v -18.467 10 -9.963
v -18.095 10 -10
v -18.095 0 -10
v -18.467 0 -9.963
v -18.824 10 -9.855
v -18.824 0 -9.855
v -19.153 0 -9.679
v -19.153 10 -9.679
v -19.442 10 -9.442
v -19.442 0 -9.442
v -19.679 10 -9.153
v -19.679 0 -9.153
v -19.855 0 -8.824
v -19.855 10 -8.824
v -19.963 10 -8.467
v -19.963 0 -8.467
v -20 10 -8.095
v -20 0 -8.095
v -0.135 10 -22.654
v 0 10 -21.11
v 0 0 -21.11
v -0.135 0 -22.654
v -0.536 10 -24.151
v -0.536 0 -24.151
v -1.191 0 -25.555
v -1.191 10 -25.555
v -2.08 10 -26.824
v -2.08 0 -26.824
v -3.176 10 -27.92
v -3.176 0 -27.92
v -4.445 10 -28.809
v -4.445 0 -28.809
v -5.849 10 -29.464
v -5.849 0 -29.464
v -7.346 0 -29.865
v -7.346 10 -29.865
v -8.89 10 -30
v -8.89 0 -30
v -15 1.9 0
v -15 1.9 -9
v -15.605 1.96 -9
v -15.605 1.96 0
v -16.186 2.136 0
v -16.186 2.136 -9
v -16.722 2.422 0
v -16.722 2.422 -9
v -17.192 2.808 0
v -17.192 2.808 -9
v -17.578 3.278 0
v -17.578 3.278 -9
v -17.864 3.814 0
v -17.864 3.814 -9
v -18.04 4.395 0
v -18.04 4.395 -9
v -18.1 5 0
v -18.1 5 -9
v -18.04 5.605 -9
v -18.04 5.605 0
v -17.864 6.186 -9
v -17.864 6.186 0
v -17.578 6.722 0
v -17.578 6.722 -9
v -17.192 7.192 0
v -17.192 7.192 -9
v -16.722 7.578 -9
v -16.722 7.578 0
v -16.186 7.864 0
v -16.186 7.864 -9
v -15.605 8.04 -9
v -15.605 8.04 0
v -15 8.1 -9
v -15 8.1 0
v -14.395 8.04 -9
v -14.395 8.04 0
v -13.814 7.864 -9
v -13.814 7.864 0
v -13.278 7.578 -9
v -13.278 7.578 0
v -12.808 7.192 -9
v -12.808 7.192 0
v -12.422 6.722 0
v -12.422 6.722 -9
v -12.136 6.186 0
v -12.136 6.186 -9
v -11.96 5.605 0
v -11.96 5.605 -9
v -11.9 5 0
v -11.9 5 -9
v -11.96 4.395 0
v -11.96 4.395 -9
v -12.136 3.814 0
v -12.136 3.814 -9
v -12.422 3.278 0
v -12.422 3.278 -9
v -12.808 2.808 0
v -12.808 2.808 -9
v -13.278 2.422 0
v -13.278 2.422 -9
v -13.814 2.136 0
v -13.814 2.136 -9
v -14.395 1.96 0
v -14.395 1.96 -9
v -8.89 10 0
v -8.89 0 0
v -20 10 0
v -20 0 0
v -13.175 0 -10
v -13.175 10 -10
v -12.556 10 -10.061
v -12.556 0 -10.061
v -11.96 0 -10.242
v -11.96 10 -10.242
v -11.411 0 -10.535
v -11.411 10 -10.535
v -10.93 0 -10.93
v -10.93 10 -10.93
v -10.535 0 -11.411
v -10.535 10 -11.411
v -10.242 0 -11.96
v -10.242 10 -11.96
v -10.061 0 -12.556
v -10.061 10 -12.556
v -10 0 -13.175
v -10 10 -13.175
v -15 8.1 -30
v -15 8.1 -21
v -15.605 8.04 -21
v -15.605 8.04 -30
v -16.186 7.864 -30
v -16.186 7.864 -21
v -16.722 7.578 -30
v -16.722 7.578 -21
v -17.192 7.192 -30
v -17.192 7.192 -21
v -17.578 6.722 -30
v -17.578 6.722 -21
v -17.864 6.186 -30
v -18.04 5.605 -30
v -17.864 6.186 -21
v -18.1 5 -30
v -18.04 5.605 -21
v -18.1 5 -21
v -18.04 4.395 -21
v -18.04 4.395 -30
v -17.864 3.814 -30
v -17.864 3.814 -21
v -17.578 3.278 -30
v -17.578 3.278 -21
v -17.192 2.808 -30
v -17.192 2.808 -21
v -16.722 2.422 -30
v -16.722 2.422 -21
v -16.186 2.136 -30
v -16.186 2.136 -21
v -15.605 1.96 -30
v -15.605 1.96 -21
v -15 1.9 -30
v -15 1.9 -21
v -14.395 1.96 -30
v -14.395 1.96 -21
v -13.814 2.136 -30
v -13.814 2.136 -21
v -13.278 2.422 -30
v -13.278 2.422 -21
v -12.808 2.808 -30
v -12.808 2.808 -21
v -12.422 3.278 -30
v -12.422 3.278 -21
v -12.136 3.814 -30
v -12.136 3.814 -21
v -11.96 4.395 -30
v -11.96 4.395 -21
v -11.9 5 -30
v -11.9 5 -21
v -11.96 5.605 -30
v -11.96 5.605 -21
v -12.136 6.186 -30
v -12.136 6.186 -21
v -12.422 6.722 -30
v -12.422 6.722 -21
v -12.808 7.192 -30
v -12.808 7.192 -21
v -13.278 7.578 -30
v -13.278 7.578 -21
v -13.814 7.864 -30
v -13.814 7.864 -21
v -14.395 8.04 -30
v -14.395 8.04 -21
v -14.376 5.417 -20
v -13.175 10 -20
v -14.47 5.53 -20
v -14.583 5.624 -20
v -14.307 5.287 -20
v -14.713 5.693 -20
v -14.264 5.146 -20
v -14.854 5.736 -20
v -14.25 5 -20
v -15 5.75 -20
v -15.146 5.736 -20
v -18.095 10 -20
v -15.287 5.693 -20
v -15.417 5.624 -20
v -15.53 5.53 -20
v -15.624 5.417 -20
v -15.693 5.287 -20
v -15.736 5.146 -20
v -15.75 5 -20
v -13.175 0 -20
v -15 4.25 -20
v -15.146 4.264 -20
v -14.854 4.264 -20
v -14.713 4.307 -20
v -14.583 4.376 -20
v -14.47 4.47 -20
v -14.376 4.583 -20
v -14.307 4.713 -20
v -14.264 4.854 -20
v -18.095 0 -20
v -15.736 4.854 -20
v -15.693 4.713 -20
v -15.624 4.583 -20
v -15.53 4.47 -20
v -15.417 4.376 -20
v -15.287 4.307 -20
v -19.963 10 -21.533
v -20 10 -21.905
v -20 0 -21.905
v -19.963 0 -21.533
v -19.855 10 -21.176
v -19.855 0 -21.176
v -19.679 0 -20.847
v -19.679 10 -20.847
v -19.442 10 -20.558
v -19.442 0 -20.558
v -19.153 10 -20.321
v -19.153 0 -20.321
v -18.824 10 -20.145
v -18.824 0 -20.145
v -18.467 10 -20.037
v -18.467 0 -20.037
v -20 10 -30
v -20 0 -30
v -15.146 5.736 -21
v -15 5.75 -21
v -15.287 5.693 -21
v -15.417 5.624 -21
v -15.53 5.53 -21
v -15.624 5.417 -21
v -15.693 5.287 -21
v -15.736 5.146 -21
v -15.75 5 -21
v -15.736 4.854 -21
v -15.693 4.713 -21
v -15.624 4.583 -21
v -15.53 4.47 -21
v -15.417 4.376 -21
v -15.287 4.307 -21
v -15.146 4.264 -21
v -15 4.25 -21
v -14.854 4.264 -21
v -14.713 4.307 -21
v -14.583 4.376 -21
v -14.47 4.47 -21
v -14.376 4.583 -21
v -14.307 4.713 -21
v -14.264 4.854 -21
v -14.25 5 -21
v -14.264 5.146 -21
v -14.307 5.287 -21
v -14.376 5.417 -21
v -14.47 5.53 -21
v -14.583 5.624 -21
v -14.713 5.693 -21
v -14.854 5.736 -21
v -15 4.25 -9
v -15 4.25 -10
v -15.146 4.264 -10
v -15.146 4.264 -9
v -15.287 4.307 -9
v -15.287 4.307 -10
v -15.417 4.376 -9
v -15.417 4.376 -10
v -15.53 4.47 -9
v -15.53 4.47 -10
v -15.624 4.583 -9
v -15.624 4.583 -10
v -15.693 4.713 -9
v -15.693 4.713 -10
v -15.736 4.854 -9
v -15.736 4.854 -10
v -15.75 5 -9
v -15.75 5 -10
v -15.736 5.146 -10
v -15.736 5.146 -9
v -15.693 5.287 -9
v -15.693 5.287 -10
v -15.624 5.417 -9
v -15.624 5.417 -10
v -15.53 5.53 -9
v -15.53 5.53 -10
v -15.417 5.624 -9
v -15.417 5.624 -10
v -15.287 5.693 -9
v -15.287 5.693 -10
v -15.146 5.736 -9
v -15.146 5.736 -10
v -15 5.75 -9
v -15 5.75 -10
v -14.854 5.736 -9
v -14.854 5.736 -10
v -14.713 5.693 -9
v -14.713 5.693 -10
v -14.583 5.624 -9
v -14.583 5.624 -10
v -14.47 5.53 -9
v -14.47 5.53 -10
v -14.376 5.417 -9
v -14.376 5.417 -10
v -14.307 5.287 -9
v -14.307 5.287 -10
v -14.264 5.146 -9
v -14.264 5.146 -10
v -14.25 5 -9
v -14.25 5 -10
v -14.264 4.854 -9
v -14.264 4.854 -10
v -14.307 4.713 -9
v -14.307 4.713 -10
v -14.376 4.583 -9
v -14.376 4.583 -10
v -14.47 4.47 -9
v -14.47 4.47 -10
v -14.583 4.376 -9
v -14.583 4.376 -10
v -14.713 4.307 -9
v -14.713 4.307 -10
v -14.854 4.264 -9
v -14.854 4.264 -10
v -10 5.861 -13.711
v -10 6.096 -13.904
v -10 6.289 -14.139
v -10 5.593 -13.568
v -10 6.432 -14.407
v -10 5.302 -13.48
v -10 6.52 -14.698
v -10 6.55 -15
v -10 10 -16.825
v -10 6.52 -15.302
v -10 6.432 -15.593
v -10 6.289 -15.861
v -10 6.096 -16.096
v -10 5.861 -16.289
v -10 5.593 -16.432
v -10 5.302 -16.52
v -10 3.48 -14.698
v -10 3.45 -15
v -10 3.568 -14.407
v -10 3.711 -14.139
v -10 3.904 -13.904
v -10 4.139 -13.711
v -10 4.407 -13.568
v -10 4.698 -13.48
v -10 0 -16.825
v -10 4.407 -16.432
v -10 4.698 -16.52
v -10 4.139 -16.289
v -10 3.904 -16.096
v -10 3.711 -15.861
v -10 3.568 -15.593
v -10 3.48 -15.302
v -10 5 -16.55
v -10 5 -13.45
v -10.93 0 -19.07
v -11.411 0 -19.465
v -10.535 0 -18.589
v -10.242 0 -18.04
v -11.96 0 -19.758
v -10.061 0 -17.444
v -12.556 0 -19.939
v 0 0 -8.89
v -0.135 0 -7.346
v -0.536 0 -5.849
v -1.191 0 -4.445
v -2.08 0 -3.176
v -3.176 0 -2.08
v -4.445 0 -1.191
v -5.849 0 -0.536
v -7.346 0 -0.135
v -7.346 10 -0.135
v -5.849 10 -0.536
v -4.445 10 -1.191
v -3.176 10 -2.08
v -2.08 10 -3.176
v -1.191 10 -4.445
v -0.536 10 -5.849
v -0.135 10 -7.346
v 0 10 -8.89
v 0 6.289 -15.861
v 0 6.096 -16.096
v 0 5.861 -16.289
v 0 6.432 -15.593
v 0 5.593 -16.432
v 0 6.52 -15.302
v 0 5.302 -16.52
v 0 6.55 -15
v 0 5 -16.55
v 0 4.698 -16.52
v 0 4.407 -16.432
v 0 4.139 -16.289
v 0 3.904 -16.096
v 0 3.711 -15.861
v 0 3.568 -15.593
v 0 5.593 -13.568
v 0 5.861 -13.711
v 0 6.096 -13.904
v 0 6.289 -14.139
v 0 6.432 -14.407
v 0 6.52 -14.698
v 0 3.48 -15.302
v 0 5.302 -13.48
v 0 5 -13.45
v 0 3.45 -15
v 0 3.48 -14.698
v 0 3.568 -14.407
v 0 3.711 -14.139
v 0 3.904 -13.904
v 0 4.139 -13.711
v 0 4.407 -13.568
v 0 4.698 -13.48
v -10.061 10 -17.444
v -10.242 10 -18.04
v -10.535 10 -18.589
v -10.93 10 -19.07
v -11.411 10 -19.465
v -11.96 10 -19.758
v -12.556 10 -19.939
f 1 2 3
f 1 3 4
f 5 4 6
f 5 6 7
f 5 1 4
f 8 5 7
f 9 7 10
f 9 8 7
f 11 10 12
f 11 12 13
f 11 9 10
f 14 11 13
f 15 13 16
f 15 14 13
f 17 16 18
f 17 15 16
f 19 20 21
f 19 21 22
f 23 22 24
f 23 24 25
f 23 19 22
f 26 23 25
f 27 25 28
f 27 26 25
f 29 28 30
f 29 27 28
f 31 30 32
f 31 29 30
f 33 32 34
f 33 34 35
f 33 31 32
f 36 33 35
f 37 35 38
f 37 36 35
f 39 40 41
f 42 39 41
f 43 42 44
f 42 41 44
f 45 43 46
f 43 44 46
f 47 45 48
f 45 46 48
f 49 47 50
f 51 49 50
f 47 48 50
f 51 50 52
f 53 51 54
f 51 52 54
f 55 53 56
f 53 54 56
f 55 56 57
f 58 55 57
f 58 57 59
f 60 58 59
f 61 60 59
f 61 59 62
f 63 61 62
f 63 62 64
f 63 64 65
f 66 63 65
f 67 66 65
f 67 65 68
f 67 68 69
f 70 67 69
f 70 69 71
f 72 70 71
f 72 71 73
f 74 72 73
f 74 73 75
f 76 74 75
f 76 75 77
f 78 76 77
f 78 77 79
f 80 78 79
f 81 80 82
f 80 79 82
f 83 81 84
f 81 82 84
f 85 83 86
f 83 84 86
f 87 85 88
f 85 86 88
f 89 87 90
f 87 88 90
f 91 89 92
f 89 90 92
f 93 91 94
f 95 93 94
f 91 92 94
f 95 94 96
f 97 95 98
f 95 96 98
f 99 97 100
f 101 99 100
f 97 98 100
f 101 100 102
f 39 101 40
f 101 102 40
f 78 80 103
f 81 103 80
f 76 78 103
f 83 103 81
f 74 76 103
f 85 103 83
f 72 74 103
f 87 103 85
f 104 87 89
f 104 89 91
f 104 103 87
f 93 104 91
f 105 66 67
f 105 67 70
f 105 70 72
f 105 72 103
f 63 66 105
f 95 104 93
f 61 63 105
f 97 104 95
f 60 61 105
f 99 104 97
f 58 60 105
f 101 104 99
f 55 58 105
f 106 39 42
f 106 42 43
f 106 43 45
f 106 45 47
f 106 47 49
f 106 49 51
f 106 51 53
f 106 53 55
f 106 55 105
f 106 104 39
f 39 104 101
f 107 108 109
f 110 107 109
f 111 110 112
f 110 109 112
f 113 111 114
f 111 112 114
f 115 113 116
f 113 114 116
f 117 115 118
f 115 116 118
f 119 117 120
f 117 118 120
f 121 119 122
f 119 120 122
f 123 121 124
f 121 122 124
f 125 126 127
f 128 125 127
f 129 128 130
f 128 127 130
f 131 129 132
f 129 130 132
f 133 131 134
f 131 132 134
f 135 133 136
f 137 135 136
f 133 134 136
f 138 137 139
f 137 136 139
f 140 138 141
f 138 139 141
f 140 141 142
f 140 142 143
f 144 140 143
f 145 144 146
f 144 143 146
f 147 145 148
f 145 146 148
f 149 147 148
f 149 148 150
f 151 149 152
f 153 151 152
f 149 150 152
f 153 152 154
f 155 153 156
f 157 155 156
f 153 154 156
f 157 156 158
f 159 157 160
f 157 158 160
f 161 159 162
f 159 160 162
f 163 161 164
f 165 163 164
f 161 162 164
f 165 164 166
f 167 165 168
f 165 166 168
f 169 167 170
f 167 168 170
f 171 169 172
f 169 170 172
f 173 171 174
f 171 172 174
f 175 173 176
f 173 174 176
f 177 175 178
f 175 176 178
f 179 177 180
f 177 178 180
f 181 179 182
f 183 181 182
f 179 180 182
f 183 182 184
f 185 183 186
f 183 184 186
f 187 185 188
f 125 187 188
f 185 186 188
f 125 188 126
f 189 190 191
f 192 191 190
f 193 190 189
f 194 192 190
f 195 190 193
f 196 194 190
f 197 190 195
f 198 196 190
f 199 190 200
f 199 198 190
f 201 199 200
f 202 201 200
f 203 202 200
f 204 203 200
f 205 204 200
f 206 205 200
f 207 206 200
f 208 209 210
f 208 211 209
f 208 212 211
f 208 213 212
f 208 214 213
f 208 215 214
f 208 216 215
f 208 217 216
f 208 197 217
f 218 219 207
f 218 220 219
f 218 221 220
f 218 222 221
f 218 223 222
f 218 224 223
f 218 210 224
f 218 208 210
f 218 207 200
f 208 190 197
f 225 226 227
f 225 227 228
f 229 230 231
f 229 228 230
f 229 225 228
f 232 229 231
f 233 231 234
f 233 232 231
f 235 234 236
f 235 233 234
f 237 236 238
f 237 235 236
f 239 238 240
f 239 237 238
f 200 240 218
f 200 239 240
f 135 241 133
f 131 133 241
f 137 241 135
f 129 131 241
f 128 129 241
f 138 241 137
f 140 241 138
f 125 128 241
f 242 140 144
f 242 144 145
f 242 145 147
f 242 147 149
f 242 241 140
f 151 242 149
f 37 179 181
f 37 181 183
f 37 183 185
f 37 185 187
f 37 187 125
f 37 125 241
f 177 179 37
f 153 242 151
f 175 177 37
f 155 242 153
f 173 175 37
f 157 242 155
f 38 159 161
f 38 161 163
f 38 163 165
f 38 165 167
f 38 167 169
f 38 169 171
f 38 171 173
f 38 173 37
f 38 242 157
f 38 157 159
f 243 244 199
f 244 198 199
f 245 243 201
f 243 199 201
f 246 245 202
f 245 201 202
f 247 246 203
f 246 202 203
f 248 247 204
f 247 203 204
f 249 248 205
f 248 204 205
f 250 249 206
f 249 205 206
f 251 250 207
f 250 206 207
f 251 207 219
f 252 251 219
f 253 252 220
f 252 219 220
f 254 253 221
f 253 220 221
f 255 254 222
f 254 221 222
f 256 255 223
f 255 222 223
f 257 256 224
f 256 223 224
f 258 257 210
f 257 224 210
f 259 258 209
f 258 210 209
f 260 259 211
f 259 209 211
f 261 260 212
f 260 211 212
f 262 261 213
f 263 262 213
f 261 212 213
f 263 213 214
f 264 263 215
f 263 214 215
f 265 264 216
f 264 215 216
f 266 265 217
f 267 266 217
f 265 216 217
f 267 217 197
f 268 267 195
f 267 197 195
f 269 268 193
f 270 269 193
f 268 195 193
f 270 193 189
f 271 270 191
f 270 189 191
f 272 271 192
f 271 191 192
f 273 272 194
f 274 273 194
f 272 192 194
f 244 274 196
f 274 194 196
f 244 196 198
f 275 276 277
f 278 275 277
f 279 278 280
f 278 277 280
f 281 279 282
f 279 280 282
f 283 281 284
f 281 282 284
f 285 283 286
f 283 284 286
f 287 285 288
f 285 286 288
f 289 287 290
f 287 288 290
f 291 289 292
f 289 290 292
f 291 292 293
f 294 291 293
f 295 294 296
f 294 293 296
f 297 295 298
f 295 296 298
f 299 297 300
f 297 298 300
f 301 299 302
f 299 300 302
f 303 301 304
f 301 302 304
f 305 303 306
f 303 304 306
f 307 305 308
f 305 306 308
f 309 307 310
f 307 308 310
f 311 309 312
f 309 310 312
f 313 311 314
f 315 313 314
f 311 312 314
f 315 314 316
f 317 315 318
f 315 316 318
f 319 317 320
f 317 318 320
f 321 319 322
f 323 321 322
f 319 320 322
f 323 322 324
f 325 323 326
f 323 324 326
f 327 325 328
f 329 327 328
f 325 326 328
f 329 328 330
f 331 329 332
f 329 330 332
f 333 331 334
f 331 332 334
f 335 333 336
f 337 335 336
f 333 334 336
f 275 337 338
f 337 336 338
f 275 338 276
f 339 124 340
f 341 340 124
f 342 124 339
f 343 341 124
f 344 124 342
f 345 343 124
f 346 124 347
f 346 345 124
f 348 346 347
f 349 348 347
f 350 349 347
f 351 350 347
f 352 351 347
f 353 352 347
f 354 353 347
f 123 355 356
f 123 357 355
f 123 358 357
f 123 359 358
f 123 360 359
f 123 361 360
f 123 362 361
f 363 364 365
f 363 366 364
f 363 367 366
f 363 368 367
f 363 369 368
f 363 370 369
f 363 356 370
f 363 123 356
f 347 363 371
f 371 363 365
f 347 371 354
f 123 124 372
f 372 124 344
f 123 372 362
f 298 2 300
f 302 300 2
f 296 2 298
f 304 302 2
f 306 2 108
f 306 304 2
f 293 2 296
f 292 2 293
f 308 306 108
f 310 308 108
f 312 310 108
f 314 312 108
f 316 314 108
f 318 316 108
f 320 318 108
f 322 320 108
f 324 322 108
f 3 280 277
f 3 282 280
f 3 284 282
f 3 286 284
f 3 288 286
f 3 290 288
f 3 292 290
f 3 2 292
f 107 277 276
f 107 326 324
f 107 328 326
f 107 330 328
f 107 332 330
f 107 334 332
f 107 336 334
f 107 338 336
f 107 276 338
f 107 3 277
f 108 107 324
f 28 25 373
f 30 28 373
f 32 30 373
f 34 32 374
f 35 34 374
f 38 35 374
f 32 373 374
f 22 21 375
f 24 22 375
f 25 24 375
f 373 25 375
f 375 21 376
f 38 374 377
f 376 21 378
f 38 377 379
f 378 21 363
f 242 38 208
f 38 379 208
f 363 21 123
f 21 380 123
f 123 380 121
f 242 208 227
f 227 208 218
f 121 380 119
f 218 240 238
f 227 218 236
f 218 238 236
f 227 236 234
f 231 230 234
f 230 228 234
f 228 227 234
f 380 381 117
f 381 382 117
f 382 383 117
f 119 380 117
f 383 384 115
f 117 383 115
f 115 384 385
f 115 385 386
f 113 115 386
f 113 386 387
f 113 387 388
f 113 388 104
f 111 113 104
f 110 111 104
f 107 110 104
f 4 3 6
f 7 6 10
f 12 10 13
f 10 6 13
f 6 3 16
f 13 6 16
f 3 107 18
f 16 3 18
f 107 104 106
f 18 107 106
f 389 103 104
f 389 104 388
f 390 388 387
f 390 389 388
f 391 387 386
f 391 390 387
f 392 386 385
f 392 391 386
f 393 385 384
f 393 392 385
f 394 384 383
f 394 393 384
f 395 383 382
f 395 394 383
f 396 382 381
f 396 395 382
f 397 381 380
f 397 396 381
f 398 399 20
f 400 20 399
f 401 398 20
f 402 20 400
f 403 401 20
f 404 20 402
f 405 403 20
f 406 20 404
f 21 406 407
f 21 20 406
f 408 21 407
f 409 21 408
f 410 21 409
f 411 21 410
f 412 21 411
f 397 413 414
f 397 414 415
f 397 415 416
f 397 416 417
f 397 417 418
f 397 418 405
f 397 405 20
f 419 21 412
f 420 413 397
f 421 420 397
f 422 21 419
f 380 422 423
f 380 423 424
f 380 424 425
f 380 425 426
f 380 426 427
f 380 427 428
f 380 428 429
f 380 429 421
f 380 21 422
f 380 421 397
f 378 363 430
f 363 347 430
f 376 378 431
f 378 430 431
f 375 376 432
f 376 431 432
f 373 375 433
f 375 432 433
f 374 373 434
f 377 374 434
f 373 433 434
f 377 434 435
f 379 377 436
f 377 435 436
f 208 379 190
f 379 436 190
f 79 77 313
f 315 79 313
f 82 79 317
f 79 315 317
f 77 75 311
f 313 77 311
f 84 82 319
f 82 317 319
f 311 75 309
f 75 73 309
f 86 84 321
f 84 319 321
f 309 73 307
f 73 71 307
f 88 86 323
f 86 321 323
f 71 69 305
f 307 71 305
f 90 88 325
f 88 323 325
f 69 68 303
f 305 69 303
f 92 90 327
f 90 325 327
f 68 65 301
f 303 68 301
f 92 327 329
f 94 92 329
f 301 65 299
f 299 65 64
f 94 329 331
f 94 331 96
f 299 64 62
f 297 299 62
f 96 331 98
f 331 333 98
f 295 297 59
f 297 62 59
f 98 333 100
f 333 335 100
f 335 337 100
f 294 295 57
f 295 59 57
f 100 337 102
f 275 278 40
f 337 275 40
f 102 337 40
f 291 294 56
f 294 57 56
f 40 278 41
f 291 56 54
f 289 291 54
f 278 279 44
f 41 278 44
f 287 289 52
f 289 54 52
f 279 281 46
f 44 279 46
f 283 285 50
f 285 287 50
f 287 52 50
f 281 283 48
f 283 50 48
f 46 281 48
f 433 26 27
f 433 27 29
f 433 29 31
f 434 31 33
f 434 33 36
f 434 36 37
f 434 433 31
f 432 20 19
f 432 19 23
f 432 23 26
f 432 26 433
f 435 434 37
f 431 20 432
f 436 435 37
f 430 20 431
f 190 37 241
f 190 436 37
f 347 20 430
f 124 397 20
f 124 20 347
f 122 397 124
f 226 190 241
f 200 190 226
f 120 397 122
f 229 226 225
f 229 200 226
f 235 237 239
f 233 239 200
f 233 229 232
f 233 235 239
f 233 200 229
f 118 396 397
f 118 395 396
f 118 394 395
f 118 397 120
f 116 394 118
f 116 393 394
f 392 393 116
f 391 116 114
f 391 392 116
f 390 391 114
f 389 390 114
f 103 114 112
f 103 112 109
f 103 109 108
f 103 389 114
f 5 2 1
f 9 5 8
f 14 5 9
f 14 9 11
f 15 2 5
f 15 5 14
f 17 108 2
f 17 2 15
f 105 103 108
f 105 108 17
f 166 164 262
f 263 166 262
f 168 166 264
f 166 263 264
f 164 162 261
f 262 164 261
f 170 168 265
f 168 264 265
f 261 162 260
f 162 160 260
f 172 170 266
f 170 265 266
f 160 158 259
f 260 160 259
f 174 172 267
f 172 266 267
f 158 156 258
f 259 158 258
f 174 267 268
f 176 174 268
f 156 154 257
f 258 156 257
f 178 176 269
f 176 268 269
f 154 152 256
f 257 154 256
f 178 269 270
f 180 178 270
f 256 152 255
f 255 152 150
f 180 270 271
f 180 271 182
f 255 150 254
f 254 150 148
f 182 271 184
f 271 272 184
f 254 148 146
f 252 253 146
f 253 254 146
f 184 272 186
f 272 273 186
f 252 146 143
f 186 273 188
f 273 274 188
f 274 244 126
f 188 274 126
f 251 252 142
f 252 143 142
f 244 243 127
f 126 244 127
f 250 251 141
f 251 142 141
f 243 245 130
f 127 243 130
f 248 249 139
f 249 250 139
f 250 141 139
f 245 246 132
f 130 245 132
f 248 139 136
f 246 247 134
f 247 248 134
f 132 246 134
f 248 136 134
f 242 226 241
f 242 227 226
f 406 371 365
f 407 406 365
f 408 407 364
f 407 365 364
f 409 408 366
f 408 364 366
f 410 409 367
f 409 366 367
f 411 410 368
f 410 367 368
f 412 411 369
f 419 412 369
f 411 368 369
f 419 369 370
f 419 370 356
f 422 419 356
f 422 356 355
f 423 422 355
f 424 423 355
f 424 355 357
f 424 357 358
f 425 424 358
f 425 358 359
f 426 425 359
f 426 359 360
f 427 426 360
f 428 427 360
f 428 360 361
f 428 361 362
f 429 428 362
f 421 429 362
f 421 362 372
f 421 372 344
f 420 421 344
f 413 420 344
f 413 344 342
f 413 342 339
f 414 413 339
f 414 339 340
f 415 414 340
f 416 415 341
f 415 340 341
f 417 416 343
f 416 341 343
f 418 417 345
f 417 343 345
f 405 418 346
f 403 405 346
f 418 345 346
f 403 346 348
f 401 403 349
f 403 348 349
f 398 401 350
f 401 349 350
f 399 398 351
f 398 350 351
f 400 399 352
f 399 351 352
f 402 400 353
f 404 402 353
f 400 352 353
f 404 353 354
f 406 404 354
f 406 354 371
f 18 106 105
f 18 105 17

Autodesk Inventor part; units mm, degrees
ref_plane "YZ Plane" through (0, 0, 0) normal (1, 0, 0) x (0, 1, 0)
ref_plane "XZ Plane" through (0, 0, 0) normal (0, 1, 0) x (-1, 0, 0)
ref_plane "XY Plane" through (0, 0, 0) normal (0, 0, 1) x (1, 0, 0)
sketch "Sketch1" plane through (0, 0, 0) normal (0, 1, 0) x (-1, 0, 0)
  line L0 (0, 0) -> (20, 0)
  line L1 (20, -30) -> (0, -30)
  line L2 (0, -30) -> (0, 0)
  line L3 (20, 0) -> (20, -10)
  line L4 (20, -10) -> (10, -10)
  line L5 (10, -10) -> (10, -20)
  line L6 (10, -20) -> (20, -20)
  line L7 (20, -20) -> (20, -30)
  dimension "d0" = 20
  dimension "d1" = 30
  dimension "d2" = 10
  dimension "d3" = 10
  dimension "d4" = 10
  dimension "d5" = 10
  dimension "d8" = 20
extrude "Extrusion1" add sketch "Sketch1" along normal blind 10
sketch "Sketch2" plane through (-20, 0, 0) normal (0, 0, 1) x (1, 0, 0)
  line L0 (0, 0) -> (0, 10) projected
  line L1 (0, 10) -> (20, 10) projected
  point P0 (20, 0)
  point P1 (5, 5)
  dimension "d16" = 5
  dimension "d17" = 5
hole "Hole1" at (-15, 5, 0) direction (0, 0, -1) diameter 1.5 depth 11 counterbore diameter 6.2 counterbore depth 9
sketch "Sketch3" plane through (0, 0, -30) normal (0, 0, -1) x (-1, 0, 0)
  line L0 (20, 0) -> (20, 10) projected
  line L1 (0, 10) -> (20, 10) projected
  point P0 (0, 0)
  point P1 (15, 5)
  dimension "d25" = 5
  dimension "d26" = 5
hole "Hole2" at (-15, 5, -30) direction (0, 0, 1) diameter 1.5 depth 11 counterbore diameter 6.2 counterbore depth 9
sketch "Sketch4" plane through (0, 0, 0) normal (1, 0, 0) x (0, 0, -1)
  line L0 (0, 10) -> (30, 10) projected
  line L1 (30, 0) -> (30, 10) projected
  point P0 (0, 0)
  point P1 (15, 5)
  dimension "d34" = 5
  dimension "d35" = 15
hole "Hole3" at (0, 5, -15) direction (-1, 0, 0) diameter 3.1 depth 20
fillet "Fillet1" radius 3.175 1 edges at (-10, 5, -20)
fillet "Fillet2" radius 3.175 1 edges at (-10, 5, -10)
fillet "Fillet3" radius 1.905 1 edges at (-20, 5, -20)
fillet "Fillet4" radius 1.905 1 edges at (-20, 5, -10)
fillet "Fillet5" radius 8.89 1 edges at (0, 5, -30)
fillet "Fillet6" radius 8.89 1 edges at (0, 5, 0)
properties part number "lickPort1"
